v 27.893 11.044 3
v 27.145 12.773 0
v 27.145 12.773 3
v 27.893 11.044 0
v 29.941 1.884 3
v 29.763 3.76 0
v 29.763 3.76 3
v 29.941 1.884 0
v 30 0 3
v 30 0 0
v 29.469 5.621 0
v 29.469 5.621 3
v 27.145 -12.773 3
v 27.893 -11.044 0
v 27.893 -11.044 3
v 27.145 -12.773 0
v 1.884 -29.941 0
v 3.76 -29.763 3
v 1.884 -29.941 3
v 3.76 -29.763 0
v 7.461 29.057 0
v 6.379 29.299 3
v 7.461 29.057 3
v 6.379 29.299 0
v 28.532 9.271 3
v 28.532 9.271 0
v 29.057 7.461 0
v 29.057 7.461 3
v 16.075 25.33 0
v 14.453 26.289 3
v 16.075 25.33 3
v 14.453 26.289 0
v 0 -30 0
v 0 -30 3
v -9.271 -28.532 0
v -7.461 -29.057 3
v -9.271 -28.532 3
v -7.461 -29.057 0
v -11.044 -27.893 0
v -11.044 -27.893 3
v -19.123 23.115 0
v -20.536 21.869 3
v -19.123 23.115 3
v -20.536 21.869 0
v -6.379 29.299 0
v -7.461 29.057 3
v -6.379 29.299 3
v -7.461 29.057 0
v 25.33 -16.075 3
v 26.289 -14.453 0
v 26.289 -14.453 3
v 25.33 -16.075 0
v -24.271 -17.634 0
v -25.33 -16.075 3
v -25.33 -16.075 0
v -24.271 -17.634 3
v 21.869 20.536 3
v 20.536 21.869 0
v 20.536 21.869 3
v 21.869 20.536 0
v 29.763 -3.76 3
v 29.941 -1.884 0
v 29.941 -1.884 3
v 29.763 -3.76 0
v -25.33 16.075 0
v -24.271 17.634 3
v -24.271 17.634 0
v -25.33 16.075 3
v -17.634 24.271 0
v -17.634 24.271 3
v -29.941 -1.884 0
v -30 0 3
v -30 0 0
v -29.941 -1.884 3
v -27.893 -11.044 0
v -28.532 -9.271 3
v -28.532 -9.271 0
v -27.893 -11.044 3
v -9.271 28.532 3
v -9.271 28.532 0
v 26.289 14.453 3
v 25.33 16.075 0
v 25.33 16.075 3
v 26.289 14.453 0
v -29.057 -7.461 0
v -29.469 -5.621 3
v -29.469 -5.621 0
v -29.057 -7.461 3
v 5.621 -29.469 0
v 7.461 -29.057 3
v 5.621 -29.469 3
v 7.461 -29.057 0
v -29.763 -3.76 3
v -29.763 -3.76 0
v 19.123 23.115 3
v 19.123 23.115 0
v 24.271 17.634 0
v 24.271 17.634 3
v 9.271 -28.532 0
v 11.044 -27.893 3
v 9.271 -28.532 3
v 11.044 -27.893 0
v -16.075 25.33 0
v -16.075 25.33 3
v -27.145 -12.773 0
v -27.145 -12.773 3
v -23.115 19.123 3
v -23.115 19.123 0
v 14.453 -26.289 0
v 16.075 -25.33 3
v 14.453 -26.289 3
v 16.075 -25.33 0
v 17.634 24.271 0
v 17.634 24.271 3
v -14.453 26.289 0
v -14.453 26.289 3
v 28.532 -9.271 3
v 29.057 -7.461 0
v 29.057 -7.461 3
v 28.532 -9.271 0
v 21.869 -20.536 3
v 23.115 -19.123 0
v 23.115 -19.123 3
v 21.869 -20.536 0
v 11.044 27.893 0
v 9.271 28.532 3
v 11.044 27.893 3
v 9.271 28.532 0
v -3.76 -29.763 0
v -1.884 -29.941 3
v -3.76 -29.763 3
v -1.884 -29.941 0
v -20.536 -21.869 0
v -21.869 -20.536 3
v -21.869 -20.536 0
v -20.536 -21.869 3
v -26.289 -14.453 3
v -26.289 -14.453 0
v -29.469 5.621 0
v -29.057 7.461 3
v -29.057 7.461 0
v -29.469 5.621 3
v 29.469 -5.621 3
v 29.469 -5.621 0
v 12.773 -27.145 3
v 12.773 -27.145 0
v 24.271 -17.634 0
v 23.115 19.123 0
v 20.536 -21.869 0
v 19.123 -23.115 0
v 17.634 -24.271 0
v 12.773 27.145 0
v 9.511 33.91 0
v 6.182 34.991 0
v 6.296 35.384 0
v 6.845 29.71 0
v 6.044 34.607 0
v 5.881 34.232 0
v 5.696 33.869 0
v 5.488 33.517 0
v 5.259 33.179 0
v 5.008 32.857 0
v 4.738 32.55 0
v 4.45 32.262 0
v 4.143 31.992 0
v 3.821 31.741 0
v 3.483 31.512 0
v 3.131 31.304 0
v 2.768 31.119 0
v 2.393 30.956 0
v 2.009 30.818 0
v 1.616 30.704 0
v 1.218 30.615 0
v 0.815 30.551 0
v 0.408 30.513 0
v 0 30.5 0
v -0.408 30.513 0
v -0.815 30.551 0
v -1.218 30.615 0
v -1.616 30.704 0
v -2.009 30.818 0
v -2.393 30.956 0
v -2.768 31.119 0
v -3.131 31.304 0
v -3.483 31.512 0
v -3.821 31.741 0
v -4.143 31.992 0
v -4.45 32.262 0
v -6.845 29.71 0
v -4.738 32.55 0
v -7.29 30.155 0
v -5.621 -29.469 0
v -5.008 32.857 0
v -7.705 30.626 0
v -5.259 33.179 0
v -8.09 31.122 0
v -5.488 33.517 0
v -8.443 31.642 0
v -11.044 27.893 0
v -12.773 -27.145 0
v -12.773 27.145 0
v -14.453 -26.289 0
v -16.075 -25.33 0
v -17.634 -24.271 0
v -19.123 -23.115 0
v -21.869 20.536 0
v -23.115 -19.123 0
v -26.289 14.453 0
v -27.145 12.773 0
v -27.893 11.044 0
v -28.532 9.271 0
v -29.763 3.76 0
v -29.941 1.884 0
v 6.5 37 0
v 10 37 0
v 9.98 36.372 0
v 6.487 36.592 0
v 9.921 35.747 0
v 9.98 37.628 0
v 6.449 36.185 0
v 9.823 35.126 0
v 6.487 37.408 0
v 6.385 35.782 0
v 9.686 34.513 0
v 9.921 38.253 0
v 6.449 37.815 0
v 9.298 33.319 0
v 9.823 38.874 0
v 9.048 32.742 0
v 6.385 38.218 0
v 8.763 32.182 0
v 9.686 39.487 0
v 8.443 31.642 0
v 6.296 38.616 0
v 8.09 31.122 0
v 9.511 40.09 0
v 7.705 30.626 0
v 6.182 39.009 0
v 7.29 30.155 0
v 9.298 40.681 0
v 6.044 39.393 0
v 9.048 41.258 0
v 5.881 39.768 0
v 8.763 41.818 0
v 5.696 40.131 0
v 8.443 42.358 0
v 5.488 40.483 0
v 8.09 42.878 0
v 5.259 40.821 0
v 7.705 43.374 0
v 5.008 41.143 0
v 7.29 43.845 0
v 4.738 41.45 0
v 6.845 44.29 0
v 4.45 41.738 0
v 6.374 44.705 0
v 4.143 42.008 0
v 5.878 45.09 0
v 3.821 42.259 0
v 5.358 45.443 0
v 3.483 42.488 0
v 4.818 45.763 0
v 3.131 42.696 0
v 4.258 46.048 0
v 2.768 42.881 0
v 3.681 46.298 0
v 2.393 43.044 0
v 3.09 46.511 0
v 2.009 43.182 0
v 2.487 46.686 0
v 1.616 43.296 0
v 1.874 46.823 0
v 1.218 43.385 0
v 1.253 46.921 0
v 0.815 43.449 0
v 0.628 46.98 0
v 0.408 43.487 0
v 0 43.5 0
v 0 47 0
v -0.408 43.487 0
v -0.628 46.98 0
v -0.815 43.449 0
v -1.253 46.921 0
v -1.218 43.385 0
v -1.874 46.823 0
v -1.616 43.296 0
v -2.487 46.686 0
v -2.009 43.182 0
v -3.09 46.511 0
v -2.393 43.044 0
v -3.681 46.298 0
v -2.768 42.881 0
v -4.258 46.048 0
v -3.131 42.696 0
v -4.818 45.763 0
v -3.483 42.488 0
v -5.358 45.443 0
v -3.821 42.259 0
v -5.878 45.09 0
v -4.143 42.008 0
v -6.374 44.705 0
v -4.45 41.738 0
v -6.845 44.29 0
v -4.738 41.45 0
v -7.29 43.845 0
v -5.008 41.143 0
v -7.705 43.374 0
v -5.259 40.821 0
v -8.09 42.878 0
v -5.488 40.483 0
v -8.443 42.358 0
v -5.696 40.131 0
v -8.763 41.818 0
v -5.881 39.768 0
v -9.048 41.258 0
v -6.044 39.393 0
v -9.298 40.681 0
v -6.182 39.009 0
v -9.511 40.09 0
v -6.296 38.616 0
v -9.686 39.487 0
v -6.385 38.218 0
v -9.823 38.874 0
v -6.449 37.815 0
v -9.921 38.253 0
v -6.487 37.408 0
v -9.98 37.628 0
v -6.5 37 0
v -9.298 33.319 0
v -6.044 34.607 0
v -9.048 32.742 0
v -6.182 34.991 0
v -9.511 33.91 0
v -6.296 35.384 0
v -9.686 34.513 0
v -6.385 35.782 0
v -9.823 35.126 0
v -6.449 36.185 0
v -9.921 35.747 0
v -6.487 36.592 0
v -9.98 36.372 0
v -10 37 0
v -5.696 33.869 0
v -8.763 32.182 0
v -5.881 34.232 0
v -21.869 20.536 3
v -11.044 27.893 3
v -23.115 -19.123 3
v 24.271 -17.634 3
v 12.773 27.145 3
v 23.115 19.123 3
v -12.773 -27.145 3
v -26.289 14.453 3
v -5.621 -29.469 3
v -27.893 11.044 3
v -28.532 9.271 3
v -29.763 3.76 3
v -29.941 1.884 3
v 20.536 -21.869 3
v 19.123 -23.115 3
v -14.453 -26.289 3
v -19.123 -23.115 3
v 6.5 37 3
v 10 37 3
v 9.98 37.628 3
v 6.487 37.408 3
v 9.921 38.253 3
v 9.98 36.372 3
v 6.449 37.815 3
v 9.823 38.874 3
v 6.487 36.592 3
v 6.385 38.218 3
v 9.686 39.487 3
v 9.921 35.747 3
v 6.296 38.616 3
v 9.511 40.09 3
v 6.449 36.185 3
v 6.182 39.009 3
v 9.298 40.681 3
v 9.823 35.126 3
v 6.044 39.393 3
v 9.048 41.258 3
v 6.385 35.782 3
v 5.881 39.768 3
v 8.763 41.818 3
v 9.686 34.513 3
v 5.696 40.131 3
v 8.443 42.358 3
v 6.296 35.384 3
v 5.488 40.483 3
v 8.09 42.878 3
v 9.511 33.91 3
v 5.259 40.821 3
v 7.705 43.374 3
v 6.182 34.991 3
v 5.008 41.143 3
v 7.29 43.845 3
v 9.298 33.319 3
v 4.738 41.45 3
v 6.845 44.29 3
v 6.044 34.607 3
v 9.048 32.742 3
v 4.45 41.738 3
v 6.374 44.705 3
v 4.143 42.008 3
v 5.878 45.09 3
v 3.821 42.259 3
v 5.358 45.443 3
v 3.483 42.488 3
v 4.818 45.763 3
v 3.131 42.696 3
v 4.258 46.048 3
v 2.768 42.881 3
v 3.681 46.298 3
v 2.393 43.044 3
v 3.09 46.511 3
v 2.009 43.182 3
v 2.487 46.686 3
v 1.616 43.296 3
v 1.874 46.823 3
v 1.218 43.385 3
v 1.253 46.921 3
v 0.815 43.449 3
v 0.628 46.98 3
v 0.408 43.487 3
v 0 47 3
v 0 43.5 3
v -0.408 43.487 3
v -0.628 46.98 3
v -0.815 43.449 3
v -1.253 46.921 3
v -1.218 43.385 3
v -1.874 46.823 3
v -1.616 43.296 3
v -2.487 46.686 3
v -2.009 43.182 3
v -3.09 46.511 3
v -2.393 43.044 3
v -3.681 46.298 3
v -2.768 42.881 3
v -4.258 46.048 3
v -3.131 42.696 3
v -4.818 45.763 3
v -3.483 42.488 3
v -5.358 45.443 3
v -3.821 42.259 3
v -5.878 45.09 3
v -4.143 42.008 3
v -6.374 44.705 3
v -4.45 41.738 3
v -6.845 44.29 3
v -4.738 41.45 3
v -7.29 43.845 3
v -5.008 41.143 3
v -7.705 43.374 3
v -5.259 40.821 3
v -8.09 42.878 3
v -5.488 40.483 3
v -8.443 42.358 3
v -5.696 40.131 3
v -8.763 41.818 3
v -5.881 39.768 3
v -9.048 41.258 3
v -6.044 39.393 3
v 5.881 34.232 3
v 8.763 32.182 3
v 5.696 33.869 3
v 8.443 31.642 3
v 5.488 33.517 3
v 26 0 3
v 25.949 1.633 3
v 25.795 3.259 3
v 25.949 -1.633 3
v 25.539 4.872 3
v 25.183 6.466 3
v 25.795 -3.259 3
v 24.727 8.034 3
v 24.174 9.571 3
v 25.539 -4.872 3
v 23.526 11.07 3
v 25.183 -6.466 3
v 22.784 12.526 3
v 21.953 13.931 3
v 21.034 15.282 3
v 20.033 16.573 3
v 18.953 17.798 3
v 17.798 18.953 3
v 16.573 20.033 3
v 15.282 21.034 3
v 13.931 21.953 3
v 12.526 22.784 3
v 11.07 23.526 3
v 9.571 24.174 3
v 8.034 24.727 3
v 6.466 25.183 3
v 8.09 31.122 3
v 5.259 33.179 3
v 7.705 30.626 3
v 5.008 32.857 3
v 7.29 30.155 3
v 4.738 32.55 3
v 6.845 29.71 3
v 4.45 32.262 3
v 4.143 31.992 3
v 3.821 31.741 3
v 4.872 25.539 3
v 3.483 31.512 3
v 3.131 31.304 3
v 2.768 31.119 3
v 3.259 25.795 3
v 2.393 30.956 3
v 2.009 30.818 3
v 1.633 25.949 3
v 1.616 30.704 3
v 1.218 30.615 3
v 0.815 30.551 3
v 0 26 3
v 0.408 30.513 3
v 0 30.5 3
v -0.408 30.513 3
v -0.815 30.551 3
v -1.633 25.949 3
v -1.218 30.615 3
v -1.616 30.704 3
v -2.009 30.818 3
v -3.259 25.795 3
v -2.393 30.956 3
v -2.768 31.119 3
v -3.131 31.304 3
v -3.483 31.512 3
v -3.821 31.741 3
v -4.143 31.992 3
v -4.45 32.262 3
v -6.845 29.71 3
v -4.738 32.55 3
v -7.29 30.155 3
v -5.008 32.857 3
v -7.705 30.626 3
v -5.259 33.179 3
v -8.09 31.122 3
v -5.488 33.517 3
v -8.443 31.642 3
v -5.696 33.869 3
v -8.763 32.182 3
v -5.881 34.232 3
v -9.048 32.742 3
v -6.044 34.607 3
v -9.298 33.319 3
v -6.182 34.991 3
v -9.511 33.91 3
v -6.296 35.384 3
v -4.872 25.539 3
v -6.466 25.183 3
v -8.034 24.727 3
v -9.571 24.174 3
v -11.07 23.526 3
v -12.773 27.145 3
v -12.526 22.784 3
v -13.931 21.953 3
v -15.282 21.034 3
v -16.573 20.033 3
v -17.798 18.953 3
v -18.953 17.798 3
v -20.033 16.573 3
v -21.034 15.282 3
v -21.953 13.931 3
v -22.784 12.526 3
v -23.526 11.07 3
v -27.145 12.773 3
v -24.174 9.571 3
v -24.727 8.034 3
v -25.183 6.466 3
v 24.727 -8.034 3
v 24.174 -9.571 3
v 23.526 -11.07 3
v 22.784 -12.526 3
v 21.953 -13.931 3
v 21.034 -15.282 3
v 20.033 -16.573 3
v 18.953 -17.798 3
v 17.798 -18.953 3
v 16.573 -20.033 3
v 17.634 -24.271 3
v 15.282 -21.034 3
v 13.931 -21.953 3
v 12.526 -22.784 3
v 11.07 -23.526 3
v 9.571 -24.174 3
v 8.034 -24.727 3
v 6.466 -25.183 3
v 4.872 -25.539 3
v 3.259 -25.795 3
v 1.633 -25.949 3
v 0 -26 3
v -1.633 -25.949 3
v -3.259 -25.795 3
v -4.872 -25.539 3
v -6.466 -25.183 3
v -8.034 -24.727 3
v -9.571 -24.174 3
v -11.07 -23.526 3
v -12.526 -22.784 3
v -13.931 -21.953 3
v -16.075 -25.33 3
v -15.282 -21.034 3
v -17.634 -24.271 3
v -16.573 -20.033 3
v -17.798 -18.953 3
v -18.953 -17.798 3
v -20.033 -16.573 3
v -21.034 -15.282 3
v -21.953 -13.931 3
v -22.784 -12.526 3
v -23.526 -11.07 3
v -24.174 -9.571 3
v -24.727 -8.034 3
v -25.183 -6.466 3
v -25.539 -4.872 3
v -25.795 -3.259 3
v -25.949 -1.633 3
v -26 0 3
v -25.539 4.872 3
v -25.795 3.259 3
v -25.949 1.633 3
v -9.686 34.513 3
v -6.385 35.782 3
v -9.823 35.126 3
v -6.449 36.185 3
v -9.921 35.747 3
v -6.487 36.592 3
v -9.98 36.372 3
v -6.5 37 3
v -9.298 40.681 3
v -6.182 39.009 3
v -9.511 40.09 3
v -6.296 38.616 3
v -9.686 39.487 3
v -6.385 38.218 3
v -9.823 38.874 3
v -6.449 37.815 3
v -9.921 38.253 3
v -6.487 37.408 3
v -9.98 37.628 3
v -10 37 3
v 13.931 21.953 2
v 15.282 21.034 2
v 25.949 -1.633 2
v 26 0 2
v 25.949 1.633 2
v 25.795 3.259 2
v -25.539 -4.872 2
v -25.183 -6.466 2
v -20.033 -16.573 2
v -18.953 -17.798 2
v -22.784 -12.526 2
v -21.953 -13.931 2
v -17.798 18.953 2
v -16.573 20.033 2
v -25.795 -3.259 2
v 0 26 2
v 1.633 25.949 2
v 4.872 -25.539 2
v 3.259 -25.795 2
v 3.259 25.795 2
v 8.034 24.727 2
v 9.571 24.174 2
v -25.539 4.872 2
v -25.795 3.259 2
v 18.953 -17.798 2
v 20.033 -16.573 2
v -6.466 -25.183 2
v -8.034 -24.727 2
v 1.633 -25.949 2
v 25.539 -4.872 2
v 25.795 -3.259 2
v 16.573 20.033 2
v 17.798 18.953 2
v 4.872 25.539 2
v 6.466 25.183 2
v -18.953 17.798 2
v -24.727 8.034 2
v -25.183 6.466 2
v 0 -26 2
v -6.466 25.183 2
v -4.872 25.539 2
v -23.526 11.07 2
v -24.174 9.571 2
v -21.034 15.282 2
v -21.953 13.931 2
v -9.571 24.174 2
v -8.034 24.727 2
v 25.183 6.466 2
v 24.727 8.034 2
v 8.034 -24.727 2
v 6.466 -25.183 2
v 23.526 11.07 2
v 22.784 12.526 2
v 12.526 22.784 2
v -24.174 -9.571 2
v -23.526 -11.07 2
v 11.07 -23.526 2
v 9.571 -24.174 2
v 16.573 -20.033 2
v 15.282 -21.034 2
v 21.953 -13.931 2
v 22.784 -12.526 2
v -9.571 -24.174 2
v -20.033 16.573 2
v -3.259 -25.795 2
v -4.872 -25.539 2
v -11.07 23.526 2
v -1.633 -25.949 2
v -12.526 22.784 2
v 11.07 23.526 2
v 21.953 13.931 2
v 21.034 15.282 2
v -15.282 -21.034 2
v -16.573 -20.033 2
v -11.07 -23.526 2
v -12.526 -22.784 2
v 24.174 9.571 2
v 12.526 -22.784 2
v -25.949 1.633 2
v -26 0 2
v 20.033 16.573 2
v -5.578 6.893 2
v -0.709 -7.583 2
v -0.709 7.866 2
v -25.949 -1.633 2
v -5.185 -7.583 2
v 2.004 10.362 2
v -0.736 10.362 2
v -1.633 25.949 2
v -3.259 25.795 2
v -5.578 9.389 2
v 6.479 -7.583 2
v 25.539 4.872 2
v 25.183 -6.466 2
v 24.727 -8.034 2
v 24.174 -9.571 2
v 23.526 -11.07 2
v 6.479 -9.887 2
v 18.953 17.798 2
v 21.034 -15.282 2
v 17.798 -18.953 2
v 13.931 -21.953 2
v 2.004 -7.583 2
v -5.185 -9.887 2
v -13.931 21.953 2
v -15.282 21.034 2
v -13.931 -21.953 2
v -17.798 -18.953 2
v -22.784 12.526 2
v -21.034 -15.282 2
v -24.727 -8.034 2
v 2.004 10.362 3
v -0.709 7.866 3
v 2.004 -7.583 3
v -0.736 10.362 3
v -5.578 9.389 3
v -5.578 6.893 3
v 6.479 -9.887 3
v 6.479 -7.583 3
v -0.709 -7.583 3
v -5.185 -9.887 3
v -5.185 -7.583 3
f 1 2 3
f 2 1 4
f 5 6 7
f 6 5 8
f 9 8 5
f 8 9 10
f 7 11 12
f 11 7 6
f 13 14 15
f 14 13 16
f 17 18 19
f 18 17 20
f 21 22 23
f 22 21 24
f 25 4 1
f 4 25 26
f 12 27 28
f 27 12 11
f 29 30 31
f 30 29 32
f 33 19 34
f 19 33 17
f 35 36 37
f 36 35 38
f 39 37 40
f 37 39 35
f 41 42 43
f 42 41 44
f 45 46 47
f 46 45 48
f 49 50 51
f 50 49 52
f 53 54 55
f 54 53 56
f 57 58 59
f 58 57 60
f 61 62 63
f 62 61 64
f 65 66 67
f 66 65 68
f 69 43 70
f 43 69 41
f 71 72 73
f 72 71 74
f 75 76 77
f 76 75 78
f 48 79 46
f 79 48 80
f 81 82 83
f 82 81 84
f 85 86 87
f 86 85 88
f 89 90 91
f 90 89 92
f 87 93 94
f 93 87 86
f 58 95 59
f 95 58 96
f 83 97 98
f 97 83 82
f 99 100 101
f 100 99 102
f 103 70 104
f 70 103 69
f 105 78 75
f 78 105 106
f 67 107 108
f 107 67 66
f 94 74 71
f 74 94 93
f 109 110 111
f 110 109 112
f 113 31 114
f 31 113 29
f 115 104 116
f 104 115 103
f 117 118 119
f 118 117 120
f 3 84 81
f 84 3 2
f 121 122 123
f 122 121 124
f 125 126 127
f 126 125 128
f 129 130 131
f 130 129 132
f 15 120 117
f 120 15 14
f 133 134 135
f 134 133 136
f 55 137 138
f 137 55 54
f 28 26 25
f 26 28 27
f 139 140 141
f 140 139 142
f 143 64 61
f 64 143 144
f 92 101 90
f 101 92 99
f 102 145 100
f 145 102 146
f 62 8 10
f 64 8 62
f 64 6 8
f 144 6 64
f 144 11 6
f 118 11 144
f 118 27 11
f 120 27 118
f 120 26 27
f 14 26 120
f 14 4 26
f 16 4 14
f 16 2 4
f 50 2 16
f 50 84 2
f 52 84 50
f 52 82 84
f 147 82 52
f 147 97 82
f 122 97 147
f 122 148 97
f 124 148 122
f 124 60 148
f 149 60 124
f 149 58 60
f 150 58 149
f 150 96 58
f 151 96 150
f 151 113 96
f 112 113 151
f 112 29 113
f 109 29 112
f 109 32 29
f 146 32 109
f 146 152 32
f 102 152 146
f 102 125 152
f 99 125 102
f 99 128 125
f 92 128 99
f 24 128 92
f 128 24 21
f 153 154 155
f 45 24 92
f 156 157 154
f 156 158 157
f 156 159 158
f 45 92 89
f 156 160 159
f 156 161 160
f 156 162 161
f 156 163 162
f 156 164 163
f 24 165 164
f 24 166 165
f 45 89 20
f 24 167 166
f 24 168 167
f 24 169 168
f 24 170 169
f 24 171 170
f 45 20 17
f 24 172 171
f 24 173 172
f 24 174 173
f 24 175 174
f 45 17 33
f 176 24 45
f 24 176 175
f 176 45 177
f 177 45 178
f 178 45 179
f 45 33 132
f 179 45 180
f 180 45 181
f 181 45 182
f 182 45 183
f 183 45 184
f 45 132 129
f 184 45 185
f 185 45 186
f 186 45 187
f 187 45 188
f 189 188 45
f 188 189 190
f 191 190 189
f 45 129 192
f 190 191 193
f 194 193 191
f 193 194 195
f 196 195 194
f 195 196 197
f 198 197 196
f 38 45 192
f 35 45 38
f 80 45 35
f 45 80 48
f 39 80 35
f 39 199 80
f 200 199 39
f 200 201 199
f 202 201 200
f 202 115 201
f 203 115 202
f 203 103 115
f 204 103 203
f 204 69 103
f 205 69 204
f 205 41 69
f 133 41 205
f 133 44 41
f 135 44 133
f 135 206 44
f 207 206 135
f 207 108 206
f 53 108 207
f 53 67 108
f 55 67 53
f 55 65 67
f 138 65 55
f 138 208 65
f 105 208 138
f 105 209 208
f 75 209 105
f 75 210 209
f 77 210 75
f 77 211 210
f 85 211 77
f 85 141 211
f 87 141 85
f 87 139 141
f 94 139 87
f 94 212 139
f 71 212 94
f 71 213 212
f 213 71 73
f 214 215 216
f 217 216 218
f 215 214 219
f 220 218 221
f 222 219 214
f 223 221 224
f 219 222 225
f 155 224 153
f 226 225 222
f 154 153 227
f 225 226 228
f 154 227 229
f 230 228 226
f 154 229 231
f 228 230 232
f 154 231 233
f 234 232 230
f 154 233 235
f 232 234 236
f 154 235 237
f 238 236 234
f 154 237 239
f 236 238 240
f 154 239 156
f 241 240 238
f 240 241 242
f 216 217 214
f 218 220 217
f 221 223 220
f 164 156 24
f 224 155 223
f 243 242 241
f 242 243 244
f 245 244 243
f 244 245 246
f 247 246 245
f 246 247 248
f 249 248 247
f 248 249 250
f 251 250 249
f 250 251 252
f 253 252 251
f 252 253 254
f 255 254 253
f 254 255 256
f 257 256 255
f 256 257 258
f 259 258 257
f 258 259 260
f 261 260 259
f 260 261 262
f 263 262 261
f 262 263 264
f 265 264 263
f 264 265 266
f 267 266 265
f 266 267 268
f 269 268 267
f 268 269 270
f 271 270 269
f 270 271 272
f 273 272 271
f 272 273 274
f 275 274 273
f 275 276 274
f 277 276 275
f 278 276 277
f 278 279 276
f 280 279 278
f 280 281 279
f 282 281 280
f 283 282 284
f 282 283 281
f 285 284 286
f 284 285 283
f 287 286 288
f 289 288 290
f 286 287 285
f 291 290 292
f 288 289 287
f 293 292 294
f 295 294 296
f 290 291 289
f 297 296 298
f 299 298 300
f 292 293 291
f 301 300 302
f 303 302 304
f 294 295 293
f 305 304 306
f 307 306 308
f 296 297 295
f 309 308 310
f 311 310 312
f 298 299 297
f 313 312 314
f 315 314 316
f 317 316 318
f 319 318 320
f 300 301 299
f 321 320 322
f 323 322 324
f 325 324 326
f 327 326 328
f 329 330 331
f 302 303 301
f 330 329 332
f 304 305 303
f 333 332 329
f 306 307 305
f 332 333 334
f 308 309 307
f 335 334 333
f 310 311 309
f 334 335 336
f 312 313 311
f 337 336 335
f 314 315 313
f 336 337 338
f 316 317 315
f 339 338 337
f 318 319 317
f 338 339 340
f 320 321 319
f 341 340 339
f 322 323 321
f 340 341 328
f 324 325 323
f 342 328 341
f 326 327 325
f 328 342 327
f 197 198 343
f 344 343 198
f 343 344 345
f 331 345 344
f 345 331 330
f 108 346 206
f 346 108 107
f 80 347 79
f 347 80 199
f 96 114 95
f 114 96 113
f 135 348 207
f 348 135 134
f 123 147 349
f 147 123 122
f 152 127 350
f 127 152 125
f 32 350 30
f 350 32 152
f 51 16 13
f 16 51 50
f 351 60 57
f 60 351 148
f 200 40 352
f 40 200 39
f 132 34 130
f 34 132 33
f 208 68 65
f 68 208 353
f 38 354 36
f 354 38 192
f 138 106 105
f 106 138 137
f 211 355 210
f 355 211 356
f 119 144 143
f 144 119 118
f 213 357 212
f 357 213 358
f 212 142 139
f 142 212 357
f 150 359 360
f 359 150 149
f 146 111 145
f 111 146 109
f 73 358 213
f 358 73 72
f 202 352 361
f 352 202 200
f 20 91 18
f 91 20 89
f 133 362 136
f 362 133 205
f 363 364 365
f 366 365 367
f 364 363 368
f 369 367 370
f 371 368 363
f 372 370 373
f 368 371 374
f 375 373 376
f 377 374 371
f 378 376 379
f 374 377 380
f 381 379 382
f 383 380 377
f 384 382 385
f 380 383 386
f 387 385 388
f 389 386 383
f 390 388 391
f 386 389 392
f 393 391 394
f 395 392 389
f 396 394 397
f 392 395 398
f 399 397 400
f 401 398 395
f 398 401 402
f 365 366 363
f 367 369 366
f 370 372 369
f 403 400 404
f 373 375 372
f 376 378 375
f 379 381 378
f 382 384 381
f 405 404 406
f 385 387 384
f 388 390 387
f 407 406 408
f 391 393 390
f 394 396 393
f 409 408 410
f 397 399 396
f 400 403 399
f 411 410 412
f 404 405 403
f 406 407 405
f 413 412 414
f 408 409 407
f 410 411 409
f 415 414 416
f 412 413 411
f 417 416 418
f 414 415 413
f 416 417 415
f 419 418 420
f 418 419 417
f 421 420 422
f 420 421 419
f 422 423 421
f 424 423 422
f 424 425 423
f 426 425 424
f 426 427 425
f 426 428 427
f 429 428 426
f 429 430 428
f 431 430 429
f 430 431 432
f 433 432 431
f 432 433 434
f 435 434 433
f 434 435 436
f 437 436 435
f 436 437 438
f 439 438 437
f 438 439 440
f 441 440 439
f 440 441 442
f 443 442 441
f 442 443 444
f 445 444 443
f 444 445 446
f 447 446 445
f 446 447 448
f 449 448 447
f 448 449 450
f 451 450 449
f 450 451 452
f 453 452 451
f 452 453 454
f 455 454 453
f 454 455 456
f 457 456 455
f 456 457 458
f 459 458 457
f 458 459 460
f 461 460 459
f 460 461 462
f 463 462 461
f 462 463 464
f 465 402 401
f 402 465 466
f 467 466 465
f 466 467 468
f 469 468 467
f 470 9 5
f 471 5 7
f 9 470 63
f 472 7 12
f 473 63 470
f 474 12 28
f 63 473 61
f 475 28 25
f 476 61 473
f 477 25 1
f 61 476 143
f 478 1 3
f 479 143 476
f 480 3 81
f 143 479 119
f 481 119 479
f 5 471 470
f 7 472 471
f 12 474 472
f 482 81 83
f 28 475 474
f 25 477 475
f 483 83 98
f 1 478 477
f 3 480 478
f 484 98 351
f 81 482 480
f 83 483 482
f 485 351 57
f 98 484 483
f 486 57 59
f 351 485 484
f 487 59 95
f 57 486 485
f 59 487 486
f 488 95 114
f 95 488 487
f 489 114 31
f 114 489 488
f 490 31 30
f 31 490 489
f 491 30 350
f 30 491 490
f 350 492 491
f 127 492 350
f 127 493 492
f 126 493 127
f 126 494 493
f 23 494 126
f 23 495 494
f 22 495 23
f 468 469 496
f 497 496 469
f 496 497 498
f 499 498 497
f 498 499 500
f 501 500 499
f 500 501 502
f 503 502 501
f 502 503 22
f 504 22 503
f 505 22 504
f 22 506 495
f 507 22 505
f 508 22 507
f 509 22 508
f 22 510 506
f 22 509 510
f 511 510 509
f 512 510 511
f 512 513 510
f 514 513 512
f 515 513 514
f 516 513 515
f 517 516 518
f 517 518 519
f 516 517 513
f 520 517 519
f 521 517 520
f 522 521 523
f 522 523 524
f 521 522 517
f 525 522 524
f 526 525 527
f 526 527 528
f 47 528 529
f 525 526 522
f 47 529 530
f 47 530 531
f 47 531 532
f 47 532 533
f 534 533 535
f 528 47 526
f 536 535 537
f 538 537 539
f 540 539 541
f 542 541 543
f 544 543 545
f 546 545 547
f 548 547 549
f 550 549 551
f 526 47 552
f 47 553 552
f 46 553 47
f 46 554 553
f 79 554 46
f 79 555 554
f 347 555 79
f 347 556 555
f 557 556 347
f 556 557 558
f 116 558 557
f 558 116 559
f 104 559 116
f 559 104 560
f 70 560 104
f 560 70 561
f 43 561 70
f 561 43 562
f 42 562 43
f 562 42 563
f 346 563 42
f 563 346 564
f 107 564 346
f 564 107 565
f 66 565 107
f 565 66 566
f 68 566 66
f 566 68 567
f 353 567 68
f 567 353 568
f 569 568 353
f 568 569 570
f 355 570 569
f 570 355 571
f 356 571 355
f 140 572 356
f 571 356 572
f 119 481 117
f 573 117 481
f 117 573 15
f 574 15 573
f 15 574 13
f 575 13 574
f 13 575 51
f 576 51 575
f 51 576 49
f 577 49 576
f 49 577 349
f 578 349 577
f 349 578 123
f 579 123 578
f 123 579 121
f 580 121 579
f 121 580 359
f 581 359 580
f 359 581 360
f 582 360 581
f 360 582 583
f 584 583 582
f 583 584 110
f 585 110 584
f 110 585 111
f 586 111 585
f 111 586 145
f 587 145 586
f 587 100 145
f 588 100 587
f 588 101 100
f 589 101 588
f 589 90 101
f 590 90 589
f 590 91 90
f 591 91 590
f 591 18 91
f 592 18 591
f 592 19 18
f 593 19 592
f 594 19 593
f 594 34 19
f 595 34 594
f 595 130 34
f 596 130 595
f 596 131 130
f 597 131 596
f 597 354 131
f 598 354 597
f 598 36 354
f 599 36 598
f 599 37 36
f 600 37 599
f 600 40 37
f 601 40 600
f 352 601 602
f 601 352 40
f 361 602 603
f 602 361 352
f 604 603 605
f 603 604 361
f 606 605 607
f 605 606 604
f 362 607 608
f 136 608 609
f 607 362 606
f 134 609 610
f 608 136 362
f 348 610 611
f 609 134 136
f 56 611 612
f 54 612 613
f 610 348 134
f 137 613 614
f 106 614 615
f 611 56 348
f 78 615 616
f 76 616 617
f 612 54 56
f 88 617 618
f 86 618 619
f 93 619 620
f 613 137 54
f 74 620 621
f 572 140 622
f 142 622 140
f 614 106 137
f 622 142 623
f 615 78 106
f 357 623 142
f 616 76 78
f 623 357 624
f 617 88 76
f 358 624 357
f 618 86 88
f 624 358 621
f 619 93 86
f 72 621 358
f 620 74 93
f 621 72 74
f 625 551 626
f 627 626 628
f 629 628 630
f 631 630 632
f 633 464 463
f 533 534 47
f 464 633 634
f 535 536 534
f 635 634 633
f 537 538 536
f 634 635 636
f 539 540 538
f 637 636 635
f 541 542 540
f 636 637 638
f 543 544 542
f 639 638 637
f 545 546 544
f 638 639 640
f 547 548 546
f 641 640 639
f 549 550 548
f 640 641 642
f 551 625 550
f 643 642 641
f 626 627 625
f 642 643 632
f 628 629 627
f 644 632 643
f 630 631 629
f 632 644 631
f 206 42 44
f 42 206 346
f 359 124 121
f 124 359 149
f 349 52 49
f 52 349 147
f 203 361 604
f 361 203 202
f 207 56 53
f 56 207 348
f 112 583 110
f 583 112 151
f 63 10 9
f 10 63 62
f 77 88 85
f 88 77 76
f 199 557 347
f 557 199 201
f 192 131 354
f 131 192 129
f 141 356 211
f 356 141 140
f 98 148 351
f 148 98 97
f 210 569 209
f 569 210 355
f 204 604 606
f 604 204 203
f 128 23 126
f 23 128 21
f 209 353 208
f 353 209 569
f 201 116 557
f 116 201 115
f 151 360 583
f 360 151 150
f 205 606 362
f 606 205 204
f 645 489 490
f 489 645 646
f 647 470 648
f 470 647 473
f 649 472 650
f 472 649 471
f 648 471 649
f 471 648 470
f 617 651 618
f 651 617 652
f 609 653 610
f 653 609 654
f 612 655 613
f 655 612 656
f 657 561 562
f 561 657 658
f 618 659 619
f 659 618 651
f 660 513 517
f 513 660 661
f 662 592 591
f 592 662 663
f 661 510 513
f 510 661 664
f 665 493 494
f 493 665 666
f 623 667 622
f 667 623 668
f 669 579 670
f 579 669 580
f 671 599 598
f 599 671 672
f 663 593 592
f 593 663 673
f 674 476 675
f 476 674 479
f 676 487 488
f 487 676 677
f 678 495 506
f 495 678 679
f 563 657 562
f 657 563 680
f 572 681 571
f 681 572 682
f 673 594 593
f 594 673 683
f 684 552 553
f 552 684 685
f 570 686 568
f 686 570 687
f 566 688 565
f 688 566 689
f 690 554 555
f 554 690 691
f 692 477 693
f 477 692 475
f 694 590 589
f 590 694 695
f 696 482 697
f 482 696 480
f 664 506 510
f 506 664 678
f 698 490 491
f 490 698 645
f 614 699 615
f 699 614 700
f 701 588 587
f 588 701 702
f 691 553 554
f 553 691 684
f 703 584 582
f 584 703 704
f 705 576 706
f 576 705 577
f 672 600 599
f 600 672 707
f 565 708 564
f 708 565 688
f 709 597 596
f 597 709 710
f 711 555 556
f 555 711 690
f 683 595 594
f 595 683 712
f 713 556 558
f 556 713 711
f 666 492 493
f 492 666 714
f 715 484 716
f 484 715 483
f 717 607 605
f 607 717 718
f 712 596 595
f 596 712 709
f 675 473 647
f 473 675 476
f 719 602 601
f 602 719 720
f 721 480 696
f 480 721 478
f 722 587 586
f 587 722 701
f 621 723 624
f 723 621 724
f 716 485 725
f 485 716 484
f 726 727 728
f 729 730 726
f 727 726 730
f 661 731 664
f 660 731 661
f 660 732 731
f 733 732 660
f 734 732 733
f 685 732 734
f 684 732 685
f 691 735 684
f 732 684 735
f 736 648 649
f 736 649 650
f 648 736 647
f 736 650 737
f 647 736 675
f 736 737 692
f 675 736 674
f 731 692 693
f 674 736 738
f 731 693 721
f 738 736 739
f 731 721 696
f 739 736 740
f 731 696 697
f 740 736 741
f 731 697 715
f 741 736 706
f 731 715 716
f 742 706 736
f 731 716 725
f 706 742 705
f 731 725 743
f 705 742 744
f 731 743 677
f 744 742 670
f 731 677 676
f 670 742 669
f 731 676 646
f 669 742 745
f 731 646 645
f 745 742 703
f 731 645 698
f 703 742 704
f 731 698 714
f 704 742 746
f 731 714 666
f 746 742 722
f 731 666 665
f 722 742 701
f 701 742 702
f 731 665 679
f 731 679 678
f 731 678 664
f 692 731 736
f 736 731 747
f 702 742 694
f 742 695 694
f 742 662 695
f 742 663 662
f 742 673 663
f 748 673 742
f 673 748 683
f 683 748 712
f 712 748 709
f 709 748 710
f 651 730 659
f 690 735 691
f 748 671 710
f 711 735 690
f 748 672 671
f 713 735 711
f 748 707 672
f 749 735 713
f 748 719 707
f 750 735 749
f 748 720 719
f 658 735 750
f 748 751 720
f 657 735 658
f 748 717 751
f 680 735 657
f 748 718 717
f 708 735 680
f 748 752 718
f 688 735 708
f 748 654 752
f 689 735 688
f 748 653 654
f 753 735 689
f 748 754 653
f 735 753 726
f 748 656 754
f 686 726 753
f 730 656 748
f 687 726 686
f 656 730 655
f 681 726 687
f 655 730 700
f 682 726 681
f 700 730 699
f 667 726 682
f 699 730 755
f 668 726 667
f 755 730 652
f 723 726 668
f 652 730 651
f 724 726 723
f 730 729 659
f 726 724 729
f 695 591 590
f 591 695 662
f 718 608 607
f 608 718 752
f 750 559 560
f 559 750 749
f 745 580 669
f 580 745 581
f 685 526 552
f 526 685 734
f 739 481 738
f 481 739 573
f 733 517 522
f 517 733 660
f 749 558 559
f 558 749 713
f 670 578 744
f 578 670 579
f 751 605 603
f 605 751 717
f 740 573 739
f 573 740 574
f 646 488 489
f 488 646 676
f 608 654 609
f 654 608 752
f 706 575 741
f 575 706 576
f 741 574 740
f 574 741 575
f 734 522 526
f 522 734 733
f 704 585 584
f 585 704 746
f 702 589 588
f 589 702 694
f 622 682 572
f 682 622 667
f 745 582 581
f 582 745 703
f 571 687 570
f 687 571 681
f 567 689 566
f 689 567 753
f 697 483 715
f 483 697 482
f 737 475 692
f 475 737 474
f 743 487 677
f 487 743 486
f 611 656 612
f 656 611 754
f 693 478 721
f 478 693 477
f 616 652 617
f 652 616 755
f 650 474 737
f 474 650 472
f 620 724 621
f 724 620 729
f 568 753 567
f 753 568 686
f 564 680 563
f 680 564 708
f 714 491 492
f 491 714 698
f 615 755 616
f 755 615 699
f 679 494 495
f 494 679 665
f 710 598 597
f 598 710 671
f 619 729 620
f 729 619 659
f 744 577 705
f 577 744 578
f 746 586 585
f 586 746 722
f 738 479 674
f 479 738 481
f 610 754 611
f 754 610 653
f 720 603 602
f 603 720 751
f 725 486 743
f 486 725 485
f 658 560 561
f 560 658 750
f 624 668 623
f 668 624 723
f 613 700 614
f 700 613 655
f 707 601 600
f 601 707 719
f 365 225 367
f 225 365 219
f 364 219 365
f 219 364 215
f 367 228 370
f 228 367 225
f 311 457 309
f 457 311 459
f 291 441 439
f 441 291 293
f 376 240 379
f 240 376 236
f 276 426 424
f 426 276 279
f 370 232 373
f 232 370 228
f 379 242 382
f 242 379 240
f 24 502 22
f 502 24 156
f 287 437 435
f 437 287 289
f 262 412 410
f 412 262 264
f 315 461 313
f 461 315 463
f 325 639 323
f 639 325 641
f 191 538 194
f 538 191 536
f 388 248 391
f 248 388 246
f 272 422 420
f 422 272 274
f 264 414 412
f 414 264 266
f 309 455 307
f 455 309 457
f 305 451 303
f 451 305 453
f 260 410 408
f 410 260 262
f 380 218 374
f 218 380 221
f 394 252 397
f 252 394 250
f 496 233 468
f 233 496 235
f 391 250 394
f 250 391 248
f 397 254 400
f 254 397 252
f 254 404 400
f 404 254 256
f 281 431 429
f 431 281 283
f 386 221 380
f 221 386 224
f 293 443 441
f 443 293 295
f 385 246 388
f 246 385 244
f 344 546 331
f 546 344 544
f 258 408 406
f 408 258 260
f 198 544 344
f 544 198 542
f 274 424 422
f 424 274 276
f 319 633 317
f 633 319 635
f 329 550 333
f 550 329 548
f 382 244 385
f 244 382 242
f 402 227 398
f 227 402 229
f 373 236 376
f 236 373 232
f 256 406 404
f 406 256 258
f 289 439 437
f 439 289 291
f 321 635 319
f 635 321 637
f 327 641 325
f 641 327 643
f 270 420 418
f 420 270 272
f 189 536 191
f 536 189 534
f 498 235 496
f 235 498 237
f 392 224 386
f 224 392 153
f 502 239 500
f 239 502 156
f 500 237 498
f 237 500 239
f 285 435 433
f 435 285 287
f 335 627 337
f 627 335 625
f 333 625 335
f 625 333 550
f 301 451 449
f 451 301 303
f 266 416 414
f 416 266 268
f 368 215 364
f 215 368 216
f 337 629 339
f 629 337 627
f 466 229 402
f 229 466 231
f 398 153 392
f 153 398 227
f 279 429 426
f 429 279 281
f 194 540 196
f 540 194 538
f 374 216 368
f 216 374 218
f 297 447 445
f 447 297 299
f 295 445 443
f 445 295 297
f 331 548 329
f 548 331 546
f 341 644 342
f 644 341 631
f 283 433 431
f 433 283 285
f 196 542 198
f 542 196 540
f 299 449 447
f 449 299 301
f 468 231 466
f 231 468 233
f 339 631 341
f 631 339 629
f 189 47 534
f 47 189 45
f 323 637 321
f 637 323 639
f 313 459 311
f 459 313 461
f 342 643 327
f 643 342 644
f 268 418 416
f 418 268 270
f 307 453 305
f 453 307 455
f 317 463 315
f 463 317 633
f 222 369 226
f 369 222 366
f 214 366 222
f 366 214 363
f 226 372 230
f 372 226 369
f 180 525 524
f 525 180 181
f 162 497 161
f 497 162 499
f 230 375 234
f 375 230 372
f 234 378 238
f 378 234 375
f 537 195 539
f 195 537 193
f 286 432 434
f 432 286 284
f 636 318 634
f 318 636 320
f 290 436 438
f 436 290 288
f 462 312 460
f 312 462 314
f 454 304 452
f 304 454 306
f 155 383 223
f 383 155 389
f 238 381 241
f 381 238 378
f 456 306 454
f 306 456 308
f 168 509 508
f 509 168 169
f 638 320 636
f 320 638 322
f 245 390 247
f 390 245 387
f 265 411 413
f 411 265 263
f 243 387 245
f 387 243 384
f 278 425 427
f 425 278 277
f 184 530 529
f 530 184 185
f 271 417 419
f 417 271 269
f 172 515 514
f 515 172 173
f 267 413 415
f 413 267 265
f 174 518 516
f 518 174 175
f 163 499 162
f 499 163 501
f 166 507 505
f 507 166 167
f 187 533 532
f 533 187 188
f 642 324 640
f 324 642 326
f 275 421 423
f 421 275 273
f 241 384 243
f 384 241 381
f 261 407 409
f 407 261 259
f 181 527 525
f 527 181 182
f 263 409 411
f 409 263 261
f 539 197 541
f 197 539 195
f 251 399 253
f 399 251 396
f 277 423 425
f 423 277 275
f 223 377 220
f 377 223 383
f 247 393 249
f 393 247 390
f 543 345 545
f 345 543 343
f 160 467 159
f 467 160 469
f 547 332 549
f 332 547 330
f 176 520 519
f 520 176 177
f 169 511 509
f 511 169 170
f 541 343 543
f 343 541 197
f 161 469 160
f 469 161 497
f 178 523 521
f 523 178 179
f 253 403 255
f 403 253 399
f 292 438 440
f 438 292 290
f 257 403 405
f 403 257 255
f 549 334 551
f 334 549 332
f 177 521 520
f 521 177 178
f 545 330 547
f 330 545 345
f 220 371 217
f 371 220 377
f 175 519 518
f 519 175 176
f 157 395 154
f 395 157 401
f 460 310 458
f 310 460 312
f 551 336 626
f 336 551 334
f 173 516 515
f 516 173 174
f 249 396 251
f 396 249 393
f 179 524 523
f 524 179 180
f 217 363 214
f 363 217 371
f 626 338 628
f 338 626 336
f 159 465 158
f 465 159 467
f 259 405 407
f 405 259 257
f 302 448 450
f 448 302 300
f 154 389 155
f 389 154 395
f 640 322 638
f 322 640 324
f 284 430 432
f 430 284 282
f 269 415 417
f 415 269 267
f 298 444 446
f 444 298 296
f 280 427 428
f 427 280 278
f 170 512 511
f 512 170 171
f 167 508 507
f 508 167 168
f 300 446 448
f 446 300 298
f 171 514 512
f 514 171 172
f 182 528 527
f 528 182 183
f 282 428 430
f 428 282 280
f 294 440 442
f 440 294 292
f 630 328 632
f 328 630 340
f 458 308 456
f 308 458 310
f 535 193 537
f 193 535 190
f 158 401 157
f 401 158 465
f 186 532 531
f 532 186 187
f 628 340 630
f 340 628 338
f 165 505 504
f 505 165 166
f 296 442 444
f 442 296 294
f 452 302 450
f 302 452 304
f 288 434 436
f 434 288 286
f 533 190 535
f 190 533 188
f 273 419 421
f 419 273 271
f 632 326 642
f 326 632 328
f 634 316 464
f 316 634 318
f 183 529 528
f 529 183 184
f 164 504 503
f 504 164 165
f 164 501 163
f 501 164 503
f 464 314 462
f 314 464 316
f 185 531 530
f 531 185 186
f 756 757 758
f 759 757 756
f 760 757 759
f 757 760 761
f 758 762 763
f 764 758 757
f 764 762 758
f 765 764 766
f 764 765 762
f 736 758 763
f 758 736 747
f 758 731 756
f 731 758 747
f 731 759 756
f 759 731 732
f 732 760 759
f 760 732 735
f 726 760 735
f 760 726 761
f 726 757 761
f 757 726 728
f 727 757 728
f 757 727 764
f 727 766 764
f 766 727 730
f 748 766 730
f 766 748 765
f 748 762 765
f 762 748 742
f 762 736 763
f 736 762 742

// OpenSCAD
text1="1";
textfont="arialblack";
fontsize1=20;

union(){
    difference(){
    cylinder(h=3,r=30,$fn=100);  
    translate([0,0,2])
    cylinder(h=4,r=26,$fn=100);
         
}
difference(){
translate([0,37,0])
cylinder(h=3,r=10,$fn=100);
translate([0,37,-10+2])
cylinder(h=10+2,r=6.5,$fn=100);
}
linear_extrude(height=3)
text(text1,halign="center",valign="center",size=fontsize1,font=textfont);
}
